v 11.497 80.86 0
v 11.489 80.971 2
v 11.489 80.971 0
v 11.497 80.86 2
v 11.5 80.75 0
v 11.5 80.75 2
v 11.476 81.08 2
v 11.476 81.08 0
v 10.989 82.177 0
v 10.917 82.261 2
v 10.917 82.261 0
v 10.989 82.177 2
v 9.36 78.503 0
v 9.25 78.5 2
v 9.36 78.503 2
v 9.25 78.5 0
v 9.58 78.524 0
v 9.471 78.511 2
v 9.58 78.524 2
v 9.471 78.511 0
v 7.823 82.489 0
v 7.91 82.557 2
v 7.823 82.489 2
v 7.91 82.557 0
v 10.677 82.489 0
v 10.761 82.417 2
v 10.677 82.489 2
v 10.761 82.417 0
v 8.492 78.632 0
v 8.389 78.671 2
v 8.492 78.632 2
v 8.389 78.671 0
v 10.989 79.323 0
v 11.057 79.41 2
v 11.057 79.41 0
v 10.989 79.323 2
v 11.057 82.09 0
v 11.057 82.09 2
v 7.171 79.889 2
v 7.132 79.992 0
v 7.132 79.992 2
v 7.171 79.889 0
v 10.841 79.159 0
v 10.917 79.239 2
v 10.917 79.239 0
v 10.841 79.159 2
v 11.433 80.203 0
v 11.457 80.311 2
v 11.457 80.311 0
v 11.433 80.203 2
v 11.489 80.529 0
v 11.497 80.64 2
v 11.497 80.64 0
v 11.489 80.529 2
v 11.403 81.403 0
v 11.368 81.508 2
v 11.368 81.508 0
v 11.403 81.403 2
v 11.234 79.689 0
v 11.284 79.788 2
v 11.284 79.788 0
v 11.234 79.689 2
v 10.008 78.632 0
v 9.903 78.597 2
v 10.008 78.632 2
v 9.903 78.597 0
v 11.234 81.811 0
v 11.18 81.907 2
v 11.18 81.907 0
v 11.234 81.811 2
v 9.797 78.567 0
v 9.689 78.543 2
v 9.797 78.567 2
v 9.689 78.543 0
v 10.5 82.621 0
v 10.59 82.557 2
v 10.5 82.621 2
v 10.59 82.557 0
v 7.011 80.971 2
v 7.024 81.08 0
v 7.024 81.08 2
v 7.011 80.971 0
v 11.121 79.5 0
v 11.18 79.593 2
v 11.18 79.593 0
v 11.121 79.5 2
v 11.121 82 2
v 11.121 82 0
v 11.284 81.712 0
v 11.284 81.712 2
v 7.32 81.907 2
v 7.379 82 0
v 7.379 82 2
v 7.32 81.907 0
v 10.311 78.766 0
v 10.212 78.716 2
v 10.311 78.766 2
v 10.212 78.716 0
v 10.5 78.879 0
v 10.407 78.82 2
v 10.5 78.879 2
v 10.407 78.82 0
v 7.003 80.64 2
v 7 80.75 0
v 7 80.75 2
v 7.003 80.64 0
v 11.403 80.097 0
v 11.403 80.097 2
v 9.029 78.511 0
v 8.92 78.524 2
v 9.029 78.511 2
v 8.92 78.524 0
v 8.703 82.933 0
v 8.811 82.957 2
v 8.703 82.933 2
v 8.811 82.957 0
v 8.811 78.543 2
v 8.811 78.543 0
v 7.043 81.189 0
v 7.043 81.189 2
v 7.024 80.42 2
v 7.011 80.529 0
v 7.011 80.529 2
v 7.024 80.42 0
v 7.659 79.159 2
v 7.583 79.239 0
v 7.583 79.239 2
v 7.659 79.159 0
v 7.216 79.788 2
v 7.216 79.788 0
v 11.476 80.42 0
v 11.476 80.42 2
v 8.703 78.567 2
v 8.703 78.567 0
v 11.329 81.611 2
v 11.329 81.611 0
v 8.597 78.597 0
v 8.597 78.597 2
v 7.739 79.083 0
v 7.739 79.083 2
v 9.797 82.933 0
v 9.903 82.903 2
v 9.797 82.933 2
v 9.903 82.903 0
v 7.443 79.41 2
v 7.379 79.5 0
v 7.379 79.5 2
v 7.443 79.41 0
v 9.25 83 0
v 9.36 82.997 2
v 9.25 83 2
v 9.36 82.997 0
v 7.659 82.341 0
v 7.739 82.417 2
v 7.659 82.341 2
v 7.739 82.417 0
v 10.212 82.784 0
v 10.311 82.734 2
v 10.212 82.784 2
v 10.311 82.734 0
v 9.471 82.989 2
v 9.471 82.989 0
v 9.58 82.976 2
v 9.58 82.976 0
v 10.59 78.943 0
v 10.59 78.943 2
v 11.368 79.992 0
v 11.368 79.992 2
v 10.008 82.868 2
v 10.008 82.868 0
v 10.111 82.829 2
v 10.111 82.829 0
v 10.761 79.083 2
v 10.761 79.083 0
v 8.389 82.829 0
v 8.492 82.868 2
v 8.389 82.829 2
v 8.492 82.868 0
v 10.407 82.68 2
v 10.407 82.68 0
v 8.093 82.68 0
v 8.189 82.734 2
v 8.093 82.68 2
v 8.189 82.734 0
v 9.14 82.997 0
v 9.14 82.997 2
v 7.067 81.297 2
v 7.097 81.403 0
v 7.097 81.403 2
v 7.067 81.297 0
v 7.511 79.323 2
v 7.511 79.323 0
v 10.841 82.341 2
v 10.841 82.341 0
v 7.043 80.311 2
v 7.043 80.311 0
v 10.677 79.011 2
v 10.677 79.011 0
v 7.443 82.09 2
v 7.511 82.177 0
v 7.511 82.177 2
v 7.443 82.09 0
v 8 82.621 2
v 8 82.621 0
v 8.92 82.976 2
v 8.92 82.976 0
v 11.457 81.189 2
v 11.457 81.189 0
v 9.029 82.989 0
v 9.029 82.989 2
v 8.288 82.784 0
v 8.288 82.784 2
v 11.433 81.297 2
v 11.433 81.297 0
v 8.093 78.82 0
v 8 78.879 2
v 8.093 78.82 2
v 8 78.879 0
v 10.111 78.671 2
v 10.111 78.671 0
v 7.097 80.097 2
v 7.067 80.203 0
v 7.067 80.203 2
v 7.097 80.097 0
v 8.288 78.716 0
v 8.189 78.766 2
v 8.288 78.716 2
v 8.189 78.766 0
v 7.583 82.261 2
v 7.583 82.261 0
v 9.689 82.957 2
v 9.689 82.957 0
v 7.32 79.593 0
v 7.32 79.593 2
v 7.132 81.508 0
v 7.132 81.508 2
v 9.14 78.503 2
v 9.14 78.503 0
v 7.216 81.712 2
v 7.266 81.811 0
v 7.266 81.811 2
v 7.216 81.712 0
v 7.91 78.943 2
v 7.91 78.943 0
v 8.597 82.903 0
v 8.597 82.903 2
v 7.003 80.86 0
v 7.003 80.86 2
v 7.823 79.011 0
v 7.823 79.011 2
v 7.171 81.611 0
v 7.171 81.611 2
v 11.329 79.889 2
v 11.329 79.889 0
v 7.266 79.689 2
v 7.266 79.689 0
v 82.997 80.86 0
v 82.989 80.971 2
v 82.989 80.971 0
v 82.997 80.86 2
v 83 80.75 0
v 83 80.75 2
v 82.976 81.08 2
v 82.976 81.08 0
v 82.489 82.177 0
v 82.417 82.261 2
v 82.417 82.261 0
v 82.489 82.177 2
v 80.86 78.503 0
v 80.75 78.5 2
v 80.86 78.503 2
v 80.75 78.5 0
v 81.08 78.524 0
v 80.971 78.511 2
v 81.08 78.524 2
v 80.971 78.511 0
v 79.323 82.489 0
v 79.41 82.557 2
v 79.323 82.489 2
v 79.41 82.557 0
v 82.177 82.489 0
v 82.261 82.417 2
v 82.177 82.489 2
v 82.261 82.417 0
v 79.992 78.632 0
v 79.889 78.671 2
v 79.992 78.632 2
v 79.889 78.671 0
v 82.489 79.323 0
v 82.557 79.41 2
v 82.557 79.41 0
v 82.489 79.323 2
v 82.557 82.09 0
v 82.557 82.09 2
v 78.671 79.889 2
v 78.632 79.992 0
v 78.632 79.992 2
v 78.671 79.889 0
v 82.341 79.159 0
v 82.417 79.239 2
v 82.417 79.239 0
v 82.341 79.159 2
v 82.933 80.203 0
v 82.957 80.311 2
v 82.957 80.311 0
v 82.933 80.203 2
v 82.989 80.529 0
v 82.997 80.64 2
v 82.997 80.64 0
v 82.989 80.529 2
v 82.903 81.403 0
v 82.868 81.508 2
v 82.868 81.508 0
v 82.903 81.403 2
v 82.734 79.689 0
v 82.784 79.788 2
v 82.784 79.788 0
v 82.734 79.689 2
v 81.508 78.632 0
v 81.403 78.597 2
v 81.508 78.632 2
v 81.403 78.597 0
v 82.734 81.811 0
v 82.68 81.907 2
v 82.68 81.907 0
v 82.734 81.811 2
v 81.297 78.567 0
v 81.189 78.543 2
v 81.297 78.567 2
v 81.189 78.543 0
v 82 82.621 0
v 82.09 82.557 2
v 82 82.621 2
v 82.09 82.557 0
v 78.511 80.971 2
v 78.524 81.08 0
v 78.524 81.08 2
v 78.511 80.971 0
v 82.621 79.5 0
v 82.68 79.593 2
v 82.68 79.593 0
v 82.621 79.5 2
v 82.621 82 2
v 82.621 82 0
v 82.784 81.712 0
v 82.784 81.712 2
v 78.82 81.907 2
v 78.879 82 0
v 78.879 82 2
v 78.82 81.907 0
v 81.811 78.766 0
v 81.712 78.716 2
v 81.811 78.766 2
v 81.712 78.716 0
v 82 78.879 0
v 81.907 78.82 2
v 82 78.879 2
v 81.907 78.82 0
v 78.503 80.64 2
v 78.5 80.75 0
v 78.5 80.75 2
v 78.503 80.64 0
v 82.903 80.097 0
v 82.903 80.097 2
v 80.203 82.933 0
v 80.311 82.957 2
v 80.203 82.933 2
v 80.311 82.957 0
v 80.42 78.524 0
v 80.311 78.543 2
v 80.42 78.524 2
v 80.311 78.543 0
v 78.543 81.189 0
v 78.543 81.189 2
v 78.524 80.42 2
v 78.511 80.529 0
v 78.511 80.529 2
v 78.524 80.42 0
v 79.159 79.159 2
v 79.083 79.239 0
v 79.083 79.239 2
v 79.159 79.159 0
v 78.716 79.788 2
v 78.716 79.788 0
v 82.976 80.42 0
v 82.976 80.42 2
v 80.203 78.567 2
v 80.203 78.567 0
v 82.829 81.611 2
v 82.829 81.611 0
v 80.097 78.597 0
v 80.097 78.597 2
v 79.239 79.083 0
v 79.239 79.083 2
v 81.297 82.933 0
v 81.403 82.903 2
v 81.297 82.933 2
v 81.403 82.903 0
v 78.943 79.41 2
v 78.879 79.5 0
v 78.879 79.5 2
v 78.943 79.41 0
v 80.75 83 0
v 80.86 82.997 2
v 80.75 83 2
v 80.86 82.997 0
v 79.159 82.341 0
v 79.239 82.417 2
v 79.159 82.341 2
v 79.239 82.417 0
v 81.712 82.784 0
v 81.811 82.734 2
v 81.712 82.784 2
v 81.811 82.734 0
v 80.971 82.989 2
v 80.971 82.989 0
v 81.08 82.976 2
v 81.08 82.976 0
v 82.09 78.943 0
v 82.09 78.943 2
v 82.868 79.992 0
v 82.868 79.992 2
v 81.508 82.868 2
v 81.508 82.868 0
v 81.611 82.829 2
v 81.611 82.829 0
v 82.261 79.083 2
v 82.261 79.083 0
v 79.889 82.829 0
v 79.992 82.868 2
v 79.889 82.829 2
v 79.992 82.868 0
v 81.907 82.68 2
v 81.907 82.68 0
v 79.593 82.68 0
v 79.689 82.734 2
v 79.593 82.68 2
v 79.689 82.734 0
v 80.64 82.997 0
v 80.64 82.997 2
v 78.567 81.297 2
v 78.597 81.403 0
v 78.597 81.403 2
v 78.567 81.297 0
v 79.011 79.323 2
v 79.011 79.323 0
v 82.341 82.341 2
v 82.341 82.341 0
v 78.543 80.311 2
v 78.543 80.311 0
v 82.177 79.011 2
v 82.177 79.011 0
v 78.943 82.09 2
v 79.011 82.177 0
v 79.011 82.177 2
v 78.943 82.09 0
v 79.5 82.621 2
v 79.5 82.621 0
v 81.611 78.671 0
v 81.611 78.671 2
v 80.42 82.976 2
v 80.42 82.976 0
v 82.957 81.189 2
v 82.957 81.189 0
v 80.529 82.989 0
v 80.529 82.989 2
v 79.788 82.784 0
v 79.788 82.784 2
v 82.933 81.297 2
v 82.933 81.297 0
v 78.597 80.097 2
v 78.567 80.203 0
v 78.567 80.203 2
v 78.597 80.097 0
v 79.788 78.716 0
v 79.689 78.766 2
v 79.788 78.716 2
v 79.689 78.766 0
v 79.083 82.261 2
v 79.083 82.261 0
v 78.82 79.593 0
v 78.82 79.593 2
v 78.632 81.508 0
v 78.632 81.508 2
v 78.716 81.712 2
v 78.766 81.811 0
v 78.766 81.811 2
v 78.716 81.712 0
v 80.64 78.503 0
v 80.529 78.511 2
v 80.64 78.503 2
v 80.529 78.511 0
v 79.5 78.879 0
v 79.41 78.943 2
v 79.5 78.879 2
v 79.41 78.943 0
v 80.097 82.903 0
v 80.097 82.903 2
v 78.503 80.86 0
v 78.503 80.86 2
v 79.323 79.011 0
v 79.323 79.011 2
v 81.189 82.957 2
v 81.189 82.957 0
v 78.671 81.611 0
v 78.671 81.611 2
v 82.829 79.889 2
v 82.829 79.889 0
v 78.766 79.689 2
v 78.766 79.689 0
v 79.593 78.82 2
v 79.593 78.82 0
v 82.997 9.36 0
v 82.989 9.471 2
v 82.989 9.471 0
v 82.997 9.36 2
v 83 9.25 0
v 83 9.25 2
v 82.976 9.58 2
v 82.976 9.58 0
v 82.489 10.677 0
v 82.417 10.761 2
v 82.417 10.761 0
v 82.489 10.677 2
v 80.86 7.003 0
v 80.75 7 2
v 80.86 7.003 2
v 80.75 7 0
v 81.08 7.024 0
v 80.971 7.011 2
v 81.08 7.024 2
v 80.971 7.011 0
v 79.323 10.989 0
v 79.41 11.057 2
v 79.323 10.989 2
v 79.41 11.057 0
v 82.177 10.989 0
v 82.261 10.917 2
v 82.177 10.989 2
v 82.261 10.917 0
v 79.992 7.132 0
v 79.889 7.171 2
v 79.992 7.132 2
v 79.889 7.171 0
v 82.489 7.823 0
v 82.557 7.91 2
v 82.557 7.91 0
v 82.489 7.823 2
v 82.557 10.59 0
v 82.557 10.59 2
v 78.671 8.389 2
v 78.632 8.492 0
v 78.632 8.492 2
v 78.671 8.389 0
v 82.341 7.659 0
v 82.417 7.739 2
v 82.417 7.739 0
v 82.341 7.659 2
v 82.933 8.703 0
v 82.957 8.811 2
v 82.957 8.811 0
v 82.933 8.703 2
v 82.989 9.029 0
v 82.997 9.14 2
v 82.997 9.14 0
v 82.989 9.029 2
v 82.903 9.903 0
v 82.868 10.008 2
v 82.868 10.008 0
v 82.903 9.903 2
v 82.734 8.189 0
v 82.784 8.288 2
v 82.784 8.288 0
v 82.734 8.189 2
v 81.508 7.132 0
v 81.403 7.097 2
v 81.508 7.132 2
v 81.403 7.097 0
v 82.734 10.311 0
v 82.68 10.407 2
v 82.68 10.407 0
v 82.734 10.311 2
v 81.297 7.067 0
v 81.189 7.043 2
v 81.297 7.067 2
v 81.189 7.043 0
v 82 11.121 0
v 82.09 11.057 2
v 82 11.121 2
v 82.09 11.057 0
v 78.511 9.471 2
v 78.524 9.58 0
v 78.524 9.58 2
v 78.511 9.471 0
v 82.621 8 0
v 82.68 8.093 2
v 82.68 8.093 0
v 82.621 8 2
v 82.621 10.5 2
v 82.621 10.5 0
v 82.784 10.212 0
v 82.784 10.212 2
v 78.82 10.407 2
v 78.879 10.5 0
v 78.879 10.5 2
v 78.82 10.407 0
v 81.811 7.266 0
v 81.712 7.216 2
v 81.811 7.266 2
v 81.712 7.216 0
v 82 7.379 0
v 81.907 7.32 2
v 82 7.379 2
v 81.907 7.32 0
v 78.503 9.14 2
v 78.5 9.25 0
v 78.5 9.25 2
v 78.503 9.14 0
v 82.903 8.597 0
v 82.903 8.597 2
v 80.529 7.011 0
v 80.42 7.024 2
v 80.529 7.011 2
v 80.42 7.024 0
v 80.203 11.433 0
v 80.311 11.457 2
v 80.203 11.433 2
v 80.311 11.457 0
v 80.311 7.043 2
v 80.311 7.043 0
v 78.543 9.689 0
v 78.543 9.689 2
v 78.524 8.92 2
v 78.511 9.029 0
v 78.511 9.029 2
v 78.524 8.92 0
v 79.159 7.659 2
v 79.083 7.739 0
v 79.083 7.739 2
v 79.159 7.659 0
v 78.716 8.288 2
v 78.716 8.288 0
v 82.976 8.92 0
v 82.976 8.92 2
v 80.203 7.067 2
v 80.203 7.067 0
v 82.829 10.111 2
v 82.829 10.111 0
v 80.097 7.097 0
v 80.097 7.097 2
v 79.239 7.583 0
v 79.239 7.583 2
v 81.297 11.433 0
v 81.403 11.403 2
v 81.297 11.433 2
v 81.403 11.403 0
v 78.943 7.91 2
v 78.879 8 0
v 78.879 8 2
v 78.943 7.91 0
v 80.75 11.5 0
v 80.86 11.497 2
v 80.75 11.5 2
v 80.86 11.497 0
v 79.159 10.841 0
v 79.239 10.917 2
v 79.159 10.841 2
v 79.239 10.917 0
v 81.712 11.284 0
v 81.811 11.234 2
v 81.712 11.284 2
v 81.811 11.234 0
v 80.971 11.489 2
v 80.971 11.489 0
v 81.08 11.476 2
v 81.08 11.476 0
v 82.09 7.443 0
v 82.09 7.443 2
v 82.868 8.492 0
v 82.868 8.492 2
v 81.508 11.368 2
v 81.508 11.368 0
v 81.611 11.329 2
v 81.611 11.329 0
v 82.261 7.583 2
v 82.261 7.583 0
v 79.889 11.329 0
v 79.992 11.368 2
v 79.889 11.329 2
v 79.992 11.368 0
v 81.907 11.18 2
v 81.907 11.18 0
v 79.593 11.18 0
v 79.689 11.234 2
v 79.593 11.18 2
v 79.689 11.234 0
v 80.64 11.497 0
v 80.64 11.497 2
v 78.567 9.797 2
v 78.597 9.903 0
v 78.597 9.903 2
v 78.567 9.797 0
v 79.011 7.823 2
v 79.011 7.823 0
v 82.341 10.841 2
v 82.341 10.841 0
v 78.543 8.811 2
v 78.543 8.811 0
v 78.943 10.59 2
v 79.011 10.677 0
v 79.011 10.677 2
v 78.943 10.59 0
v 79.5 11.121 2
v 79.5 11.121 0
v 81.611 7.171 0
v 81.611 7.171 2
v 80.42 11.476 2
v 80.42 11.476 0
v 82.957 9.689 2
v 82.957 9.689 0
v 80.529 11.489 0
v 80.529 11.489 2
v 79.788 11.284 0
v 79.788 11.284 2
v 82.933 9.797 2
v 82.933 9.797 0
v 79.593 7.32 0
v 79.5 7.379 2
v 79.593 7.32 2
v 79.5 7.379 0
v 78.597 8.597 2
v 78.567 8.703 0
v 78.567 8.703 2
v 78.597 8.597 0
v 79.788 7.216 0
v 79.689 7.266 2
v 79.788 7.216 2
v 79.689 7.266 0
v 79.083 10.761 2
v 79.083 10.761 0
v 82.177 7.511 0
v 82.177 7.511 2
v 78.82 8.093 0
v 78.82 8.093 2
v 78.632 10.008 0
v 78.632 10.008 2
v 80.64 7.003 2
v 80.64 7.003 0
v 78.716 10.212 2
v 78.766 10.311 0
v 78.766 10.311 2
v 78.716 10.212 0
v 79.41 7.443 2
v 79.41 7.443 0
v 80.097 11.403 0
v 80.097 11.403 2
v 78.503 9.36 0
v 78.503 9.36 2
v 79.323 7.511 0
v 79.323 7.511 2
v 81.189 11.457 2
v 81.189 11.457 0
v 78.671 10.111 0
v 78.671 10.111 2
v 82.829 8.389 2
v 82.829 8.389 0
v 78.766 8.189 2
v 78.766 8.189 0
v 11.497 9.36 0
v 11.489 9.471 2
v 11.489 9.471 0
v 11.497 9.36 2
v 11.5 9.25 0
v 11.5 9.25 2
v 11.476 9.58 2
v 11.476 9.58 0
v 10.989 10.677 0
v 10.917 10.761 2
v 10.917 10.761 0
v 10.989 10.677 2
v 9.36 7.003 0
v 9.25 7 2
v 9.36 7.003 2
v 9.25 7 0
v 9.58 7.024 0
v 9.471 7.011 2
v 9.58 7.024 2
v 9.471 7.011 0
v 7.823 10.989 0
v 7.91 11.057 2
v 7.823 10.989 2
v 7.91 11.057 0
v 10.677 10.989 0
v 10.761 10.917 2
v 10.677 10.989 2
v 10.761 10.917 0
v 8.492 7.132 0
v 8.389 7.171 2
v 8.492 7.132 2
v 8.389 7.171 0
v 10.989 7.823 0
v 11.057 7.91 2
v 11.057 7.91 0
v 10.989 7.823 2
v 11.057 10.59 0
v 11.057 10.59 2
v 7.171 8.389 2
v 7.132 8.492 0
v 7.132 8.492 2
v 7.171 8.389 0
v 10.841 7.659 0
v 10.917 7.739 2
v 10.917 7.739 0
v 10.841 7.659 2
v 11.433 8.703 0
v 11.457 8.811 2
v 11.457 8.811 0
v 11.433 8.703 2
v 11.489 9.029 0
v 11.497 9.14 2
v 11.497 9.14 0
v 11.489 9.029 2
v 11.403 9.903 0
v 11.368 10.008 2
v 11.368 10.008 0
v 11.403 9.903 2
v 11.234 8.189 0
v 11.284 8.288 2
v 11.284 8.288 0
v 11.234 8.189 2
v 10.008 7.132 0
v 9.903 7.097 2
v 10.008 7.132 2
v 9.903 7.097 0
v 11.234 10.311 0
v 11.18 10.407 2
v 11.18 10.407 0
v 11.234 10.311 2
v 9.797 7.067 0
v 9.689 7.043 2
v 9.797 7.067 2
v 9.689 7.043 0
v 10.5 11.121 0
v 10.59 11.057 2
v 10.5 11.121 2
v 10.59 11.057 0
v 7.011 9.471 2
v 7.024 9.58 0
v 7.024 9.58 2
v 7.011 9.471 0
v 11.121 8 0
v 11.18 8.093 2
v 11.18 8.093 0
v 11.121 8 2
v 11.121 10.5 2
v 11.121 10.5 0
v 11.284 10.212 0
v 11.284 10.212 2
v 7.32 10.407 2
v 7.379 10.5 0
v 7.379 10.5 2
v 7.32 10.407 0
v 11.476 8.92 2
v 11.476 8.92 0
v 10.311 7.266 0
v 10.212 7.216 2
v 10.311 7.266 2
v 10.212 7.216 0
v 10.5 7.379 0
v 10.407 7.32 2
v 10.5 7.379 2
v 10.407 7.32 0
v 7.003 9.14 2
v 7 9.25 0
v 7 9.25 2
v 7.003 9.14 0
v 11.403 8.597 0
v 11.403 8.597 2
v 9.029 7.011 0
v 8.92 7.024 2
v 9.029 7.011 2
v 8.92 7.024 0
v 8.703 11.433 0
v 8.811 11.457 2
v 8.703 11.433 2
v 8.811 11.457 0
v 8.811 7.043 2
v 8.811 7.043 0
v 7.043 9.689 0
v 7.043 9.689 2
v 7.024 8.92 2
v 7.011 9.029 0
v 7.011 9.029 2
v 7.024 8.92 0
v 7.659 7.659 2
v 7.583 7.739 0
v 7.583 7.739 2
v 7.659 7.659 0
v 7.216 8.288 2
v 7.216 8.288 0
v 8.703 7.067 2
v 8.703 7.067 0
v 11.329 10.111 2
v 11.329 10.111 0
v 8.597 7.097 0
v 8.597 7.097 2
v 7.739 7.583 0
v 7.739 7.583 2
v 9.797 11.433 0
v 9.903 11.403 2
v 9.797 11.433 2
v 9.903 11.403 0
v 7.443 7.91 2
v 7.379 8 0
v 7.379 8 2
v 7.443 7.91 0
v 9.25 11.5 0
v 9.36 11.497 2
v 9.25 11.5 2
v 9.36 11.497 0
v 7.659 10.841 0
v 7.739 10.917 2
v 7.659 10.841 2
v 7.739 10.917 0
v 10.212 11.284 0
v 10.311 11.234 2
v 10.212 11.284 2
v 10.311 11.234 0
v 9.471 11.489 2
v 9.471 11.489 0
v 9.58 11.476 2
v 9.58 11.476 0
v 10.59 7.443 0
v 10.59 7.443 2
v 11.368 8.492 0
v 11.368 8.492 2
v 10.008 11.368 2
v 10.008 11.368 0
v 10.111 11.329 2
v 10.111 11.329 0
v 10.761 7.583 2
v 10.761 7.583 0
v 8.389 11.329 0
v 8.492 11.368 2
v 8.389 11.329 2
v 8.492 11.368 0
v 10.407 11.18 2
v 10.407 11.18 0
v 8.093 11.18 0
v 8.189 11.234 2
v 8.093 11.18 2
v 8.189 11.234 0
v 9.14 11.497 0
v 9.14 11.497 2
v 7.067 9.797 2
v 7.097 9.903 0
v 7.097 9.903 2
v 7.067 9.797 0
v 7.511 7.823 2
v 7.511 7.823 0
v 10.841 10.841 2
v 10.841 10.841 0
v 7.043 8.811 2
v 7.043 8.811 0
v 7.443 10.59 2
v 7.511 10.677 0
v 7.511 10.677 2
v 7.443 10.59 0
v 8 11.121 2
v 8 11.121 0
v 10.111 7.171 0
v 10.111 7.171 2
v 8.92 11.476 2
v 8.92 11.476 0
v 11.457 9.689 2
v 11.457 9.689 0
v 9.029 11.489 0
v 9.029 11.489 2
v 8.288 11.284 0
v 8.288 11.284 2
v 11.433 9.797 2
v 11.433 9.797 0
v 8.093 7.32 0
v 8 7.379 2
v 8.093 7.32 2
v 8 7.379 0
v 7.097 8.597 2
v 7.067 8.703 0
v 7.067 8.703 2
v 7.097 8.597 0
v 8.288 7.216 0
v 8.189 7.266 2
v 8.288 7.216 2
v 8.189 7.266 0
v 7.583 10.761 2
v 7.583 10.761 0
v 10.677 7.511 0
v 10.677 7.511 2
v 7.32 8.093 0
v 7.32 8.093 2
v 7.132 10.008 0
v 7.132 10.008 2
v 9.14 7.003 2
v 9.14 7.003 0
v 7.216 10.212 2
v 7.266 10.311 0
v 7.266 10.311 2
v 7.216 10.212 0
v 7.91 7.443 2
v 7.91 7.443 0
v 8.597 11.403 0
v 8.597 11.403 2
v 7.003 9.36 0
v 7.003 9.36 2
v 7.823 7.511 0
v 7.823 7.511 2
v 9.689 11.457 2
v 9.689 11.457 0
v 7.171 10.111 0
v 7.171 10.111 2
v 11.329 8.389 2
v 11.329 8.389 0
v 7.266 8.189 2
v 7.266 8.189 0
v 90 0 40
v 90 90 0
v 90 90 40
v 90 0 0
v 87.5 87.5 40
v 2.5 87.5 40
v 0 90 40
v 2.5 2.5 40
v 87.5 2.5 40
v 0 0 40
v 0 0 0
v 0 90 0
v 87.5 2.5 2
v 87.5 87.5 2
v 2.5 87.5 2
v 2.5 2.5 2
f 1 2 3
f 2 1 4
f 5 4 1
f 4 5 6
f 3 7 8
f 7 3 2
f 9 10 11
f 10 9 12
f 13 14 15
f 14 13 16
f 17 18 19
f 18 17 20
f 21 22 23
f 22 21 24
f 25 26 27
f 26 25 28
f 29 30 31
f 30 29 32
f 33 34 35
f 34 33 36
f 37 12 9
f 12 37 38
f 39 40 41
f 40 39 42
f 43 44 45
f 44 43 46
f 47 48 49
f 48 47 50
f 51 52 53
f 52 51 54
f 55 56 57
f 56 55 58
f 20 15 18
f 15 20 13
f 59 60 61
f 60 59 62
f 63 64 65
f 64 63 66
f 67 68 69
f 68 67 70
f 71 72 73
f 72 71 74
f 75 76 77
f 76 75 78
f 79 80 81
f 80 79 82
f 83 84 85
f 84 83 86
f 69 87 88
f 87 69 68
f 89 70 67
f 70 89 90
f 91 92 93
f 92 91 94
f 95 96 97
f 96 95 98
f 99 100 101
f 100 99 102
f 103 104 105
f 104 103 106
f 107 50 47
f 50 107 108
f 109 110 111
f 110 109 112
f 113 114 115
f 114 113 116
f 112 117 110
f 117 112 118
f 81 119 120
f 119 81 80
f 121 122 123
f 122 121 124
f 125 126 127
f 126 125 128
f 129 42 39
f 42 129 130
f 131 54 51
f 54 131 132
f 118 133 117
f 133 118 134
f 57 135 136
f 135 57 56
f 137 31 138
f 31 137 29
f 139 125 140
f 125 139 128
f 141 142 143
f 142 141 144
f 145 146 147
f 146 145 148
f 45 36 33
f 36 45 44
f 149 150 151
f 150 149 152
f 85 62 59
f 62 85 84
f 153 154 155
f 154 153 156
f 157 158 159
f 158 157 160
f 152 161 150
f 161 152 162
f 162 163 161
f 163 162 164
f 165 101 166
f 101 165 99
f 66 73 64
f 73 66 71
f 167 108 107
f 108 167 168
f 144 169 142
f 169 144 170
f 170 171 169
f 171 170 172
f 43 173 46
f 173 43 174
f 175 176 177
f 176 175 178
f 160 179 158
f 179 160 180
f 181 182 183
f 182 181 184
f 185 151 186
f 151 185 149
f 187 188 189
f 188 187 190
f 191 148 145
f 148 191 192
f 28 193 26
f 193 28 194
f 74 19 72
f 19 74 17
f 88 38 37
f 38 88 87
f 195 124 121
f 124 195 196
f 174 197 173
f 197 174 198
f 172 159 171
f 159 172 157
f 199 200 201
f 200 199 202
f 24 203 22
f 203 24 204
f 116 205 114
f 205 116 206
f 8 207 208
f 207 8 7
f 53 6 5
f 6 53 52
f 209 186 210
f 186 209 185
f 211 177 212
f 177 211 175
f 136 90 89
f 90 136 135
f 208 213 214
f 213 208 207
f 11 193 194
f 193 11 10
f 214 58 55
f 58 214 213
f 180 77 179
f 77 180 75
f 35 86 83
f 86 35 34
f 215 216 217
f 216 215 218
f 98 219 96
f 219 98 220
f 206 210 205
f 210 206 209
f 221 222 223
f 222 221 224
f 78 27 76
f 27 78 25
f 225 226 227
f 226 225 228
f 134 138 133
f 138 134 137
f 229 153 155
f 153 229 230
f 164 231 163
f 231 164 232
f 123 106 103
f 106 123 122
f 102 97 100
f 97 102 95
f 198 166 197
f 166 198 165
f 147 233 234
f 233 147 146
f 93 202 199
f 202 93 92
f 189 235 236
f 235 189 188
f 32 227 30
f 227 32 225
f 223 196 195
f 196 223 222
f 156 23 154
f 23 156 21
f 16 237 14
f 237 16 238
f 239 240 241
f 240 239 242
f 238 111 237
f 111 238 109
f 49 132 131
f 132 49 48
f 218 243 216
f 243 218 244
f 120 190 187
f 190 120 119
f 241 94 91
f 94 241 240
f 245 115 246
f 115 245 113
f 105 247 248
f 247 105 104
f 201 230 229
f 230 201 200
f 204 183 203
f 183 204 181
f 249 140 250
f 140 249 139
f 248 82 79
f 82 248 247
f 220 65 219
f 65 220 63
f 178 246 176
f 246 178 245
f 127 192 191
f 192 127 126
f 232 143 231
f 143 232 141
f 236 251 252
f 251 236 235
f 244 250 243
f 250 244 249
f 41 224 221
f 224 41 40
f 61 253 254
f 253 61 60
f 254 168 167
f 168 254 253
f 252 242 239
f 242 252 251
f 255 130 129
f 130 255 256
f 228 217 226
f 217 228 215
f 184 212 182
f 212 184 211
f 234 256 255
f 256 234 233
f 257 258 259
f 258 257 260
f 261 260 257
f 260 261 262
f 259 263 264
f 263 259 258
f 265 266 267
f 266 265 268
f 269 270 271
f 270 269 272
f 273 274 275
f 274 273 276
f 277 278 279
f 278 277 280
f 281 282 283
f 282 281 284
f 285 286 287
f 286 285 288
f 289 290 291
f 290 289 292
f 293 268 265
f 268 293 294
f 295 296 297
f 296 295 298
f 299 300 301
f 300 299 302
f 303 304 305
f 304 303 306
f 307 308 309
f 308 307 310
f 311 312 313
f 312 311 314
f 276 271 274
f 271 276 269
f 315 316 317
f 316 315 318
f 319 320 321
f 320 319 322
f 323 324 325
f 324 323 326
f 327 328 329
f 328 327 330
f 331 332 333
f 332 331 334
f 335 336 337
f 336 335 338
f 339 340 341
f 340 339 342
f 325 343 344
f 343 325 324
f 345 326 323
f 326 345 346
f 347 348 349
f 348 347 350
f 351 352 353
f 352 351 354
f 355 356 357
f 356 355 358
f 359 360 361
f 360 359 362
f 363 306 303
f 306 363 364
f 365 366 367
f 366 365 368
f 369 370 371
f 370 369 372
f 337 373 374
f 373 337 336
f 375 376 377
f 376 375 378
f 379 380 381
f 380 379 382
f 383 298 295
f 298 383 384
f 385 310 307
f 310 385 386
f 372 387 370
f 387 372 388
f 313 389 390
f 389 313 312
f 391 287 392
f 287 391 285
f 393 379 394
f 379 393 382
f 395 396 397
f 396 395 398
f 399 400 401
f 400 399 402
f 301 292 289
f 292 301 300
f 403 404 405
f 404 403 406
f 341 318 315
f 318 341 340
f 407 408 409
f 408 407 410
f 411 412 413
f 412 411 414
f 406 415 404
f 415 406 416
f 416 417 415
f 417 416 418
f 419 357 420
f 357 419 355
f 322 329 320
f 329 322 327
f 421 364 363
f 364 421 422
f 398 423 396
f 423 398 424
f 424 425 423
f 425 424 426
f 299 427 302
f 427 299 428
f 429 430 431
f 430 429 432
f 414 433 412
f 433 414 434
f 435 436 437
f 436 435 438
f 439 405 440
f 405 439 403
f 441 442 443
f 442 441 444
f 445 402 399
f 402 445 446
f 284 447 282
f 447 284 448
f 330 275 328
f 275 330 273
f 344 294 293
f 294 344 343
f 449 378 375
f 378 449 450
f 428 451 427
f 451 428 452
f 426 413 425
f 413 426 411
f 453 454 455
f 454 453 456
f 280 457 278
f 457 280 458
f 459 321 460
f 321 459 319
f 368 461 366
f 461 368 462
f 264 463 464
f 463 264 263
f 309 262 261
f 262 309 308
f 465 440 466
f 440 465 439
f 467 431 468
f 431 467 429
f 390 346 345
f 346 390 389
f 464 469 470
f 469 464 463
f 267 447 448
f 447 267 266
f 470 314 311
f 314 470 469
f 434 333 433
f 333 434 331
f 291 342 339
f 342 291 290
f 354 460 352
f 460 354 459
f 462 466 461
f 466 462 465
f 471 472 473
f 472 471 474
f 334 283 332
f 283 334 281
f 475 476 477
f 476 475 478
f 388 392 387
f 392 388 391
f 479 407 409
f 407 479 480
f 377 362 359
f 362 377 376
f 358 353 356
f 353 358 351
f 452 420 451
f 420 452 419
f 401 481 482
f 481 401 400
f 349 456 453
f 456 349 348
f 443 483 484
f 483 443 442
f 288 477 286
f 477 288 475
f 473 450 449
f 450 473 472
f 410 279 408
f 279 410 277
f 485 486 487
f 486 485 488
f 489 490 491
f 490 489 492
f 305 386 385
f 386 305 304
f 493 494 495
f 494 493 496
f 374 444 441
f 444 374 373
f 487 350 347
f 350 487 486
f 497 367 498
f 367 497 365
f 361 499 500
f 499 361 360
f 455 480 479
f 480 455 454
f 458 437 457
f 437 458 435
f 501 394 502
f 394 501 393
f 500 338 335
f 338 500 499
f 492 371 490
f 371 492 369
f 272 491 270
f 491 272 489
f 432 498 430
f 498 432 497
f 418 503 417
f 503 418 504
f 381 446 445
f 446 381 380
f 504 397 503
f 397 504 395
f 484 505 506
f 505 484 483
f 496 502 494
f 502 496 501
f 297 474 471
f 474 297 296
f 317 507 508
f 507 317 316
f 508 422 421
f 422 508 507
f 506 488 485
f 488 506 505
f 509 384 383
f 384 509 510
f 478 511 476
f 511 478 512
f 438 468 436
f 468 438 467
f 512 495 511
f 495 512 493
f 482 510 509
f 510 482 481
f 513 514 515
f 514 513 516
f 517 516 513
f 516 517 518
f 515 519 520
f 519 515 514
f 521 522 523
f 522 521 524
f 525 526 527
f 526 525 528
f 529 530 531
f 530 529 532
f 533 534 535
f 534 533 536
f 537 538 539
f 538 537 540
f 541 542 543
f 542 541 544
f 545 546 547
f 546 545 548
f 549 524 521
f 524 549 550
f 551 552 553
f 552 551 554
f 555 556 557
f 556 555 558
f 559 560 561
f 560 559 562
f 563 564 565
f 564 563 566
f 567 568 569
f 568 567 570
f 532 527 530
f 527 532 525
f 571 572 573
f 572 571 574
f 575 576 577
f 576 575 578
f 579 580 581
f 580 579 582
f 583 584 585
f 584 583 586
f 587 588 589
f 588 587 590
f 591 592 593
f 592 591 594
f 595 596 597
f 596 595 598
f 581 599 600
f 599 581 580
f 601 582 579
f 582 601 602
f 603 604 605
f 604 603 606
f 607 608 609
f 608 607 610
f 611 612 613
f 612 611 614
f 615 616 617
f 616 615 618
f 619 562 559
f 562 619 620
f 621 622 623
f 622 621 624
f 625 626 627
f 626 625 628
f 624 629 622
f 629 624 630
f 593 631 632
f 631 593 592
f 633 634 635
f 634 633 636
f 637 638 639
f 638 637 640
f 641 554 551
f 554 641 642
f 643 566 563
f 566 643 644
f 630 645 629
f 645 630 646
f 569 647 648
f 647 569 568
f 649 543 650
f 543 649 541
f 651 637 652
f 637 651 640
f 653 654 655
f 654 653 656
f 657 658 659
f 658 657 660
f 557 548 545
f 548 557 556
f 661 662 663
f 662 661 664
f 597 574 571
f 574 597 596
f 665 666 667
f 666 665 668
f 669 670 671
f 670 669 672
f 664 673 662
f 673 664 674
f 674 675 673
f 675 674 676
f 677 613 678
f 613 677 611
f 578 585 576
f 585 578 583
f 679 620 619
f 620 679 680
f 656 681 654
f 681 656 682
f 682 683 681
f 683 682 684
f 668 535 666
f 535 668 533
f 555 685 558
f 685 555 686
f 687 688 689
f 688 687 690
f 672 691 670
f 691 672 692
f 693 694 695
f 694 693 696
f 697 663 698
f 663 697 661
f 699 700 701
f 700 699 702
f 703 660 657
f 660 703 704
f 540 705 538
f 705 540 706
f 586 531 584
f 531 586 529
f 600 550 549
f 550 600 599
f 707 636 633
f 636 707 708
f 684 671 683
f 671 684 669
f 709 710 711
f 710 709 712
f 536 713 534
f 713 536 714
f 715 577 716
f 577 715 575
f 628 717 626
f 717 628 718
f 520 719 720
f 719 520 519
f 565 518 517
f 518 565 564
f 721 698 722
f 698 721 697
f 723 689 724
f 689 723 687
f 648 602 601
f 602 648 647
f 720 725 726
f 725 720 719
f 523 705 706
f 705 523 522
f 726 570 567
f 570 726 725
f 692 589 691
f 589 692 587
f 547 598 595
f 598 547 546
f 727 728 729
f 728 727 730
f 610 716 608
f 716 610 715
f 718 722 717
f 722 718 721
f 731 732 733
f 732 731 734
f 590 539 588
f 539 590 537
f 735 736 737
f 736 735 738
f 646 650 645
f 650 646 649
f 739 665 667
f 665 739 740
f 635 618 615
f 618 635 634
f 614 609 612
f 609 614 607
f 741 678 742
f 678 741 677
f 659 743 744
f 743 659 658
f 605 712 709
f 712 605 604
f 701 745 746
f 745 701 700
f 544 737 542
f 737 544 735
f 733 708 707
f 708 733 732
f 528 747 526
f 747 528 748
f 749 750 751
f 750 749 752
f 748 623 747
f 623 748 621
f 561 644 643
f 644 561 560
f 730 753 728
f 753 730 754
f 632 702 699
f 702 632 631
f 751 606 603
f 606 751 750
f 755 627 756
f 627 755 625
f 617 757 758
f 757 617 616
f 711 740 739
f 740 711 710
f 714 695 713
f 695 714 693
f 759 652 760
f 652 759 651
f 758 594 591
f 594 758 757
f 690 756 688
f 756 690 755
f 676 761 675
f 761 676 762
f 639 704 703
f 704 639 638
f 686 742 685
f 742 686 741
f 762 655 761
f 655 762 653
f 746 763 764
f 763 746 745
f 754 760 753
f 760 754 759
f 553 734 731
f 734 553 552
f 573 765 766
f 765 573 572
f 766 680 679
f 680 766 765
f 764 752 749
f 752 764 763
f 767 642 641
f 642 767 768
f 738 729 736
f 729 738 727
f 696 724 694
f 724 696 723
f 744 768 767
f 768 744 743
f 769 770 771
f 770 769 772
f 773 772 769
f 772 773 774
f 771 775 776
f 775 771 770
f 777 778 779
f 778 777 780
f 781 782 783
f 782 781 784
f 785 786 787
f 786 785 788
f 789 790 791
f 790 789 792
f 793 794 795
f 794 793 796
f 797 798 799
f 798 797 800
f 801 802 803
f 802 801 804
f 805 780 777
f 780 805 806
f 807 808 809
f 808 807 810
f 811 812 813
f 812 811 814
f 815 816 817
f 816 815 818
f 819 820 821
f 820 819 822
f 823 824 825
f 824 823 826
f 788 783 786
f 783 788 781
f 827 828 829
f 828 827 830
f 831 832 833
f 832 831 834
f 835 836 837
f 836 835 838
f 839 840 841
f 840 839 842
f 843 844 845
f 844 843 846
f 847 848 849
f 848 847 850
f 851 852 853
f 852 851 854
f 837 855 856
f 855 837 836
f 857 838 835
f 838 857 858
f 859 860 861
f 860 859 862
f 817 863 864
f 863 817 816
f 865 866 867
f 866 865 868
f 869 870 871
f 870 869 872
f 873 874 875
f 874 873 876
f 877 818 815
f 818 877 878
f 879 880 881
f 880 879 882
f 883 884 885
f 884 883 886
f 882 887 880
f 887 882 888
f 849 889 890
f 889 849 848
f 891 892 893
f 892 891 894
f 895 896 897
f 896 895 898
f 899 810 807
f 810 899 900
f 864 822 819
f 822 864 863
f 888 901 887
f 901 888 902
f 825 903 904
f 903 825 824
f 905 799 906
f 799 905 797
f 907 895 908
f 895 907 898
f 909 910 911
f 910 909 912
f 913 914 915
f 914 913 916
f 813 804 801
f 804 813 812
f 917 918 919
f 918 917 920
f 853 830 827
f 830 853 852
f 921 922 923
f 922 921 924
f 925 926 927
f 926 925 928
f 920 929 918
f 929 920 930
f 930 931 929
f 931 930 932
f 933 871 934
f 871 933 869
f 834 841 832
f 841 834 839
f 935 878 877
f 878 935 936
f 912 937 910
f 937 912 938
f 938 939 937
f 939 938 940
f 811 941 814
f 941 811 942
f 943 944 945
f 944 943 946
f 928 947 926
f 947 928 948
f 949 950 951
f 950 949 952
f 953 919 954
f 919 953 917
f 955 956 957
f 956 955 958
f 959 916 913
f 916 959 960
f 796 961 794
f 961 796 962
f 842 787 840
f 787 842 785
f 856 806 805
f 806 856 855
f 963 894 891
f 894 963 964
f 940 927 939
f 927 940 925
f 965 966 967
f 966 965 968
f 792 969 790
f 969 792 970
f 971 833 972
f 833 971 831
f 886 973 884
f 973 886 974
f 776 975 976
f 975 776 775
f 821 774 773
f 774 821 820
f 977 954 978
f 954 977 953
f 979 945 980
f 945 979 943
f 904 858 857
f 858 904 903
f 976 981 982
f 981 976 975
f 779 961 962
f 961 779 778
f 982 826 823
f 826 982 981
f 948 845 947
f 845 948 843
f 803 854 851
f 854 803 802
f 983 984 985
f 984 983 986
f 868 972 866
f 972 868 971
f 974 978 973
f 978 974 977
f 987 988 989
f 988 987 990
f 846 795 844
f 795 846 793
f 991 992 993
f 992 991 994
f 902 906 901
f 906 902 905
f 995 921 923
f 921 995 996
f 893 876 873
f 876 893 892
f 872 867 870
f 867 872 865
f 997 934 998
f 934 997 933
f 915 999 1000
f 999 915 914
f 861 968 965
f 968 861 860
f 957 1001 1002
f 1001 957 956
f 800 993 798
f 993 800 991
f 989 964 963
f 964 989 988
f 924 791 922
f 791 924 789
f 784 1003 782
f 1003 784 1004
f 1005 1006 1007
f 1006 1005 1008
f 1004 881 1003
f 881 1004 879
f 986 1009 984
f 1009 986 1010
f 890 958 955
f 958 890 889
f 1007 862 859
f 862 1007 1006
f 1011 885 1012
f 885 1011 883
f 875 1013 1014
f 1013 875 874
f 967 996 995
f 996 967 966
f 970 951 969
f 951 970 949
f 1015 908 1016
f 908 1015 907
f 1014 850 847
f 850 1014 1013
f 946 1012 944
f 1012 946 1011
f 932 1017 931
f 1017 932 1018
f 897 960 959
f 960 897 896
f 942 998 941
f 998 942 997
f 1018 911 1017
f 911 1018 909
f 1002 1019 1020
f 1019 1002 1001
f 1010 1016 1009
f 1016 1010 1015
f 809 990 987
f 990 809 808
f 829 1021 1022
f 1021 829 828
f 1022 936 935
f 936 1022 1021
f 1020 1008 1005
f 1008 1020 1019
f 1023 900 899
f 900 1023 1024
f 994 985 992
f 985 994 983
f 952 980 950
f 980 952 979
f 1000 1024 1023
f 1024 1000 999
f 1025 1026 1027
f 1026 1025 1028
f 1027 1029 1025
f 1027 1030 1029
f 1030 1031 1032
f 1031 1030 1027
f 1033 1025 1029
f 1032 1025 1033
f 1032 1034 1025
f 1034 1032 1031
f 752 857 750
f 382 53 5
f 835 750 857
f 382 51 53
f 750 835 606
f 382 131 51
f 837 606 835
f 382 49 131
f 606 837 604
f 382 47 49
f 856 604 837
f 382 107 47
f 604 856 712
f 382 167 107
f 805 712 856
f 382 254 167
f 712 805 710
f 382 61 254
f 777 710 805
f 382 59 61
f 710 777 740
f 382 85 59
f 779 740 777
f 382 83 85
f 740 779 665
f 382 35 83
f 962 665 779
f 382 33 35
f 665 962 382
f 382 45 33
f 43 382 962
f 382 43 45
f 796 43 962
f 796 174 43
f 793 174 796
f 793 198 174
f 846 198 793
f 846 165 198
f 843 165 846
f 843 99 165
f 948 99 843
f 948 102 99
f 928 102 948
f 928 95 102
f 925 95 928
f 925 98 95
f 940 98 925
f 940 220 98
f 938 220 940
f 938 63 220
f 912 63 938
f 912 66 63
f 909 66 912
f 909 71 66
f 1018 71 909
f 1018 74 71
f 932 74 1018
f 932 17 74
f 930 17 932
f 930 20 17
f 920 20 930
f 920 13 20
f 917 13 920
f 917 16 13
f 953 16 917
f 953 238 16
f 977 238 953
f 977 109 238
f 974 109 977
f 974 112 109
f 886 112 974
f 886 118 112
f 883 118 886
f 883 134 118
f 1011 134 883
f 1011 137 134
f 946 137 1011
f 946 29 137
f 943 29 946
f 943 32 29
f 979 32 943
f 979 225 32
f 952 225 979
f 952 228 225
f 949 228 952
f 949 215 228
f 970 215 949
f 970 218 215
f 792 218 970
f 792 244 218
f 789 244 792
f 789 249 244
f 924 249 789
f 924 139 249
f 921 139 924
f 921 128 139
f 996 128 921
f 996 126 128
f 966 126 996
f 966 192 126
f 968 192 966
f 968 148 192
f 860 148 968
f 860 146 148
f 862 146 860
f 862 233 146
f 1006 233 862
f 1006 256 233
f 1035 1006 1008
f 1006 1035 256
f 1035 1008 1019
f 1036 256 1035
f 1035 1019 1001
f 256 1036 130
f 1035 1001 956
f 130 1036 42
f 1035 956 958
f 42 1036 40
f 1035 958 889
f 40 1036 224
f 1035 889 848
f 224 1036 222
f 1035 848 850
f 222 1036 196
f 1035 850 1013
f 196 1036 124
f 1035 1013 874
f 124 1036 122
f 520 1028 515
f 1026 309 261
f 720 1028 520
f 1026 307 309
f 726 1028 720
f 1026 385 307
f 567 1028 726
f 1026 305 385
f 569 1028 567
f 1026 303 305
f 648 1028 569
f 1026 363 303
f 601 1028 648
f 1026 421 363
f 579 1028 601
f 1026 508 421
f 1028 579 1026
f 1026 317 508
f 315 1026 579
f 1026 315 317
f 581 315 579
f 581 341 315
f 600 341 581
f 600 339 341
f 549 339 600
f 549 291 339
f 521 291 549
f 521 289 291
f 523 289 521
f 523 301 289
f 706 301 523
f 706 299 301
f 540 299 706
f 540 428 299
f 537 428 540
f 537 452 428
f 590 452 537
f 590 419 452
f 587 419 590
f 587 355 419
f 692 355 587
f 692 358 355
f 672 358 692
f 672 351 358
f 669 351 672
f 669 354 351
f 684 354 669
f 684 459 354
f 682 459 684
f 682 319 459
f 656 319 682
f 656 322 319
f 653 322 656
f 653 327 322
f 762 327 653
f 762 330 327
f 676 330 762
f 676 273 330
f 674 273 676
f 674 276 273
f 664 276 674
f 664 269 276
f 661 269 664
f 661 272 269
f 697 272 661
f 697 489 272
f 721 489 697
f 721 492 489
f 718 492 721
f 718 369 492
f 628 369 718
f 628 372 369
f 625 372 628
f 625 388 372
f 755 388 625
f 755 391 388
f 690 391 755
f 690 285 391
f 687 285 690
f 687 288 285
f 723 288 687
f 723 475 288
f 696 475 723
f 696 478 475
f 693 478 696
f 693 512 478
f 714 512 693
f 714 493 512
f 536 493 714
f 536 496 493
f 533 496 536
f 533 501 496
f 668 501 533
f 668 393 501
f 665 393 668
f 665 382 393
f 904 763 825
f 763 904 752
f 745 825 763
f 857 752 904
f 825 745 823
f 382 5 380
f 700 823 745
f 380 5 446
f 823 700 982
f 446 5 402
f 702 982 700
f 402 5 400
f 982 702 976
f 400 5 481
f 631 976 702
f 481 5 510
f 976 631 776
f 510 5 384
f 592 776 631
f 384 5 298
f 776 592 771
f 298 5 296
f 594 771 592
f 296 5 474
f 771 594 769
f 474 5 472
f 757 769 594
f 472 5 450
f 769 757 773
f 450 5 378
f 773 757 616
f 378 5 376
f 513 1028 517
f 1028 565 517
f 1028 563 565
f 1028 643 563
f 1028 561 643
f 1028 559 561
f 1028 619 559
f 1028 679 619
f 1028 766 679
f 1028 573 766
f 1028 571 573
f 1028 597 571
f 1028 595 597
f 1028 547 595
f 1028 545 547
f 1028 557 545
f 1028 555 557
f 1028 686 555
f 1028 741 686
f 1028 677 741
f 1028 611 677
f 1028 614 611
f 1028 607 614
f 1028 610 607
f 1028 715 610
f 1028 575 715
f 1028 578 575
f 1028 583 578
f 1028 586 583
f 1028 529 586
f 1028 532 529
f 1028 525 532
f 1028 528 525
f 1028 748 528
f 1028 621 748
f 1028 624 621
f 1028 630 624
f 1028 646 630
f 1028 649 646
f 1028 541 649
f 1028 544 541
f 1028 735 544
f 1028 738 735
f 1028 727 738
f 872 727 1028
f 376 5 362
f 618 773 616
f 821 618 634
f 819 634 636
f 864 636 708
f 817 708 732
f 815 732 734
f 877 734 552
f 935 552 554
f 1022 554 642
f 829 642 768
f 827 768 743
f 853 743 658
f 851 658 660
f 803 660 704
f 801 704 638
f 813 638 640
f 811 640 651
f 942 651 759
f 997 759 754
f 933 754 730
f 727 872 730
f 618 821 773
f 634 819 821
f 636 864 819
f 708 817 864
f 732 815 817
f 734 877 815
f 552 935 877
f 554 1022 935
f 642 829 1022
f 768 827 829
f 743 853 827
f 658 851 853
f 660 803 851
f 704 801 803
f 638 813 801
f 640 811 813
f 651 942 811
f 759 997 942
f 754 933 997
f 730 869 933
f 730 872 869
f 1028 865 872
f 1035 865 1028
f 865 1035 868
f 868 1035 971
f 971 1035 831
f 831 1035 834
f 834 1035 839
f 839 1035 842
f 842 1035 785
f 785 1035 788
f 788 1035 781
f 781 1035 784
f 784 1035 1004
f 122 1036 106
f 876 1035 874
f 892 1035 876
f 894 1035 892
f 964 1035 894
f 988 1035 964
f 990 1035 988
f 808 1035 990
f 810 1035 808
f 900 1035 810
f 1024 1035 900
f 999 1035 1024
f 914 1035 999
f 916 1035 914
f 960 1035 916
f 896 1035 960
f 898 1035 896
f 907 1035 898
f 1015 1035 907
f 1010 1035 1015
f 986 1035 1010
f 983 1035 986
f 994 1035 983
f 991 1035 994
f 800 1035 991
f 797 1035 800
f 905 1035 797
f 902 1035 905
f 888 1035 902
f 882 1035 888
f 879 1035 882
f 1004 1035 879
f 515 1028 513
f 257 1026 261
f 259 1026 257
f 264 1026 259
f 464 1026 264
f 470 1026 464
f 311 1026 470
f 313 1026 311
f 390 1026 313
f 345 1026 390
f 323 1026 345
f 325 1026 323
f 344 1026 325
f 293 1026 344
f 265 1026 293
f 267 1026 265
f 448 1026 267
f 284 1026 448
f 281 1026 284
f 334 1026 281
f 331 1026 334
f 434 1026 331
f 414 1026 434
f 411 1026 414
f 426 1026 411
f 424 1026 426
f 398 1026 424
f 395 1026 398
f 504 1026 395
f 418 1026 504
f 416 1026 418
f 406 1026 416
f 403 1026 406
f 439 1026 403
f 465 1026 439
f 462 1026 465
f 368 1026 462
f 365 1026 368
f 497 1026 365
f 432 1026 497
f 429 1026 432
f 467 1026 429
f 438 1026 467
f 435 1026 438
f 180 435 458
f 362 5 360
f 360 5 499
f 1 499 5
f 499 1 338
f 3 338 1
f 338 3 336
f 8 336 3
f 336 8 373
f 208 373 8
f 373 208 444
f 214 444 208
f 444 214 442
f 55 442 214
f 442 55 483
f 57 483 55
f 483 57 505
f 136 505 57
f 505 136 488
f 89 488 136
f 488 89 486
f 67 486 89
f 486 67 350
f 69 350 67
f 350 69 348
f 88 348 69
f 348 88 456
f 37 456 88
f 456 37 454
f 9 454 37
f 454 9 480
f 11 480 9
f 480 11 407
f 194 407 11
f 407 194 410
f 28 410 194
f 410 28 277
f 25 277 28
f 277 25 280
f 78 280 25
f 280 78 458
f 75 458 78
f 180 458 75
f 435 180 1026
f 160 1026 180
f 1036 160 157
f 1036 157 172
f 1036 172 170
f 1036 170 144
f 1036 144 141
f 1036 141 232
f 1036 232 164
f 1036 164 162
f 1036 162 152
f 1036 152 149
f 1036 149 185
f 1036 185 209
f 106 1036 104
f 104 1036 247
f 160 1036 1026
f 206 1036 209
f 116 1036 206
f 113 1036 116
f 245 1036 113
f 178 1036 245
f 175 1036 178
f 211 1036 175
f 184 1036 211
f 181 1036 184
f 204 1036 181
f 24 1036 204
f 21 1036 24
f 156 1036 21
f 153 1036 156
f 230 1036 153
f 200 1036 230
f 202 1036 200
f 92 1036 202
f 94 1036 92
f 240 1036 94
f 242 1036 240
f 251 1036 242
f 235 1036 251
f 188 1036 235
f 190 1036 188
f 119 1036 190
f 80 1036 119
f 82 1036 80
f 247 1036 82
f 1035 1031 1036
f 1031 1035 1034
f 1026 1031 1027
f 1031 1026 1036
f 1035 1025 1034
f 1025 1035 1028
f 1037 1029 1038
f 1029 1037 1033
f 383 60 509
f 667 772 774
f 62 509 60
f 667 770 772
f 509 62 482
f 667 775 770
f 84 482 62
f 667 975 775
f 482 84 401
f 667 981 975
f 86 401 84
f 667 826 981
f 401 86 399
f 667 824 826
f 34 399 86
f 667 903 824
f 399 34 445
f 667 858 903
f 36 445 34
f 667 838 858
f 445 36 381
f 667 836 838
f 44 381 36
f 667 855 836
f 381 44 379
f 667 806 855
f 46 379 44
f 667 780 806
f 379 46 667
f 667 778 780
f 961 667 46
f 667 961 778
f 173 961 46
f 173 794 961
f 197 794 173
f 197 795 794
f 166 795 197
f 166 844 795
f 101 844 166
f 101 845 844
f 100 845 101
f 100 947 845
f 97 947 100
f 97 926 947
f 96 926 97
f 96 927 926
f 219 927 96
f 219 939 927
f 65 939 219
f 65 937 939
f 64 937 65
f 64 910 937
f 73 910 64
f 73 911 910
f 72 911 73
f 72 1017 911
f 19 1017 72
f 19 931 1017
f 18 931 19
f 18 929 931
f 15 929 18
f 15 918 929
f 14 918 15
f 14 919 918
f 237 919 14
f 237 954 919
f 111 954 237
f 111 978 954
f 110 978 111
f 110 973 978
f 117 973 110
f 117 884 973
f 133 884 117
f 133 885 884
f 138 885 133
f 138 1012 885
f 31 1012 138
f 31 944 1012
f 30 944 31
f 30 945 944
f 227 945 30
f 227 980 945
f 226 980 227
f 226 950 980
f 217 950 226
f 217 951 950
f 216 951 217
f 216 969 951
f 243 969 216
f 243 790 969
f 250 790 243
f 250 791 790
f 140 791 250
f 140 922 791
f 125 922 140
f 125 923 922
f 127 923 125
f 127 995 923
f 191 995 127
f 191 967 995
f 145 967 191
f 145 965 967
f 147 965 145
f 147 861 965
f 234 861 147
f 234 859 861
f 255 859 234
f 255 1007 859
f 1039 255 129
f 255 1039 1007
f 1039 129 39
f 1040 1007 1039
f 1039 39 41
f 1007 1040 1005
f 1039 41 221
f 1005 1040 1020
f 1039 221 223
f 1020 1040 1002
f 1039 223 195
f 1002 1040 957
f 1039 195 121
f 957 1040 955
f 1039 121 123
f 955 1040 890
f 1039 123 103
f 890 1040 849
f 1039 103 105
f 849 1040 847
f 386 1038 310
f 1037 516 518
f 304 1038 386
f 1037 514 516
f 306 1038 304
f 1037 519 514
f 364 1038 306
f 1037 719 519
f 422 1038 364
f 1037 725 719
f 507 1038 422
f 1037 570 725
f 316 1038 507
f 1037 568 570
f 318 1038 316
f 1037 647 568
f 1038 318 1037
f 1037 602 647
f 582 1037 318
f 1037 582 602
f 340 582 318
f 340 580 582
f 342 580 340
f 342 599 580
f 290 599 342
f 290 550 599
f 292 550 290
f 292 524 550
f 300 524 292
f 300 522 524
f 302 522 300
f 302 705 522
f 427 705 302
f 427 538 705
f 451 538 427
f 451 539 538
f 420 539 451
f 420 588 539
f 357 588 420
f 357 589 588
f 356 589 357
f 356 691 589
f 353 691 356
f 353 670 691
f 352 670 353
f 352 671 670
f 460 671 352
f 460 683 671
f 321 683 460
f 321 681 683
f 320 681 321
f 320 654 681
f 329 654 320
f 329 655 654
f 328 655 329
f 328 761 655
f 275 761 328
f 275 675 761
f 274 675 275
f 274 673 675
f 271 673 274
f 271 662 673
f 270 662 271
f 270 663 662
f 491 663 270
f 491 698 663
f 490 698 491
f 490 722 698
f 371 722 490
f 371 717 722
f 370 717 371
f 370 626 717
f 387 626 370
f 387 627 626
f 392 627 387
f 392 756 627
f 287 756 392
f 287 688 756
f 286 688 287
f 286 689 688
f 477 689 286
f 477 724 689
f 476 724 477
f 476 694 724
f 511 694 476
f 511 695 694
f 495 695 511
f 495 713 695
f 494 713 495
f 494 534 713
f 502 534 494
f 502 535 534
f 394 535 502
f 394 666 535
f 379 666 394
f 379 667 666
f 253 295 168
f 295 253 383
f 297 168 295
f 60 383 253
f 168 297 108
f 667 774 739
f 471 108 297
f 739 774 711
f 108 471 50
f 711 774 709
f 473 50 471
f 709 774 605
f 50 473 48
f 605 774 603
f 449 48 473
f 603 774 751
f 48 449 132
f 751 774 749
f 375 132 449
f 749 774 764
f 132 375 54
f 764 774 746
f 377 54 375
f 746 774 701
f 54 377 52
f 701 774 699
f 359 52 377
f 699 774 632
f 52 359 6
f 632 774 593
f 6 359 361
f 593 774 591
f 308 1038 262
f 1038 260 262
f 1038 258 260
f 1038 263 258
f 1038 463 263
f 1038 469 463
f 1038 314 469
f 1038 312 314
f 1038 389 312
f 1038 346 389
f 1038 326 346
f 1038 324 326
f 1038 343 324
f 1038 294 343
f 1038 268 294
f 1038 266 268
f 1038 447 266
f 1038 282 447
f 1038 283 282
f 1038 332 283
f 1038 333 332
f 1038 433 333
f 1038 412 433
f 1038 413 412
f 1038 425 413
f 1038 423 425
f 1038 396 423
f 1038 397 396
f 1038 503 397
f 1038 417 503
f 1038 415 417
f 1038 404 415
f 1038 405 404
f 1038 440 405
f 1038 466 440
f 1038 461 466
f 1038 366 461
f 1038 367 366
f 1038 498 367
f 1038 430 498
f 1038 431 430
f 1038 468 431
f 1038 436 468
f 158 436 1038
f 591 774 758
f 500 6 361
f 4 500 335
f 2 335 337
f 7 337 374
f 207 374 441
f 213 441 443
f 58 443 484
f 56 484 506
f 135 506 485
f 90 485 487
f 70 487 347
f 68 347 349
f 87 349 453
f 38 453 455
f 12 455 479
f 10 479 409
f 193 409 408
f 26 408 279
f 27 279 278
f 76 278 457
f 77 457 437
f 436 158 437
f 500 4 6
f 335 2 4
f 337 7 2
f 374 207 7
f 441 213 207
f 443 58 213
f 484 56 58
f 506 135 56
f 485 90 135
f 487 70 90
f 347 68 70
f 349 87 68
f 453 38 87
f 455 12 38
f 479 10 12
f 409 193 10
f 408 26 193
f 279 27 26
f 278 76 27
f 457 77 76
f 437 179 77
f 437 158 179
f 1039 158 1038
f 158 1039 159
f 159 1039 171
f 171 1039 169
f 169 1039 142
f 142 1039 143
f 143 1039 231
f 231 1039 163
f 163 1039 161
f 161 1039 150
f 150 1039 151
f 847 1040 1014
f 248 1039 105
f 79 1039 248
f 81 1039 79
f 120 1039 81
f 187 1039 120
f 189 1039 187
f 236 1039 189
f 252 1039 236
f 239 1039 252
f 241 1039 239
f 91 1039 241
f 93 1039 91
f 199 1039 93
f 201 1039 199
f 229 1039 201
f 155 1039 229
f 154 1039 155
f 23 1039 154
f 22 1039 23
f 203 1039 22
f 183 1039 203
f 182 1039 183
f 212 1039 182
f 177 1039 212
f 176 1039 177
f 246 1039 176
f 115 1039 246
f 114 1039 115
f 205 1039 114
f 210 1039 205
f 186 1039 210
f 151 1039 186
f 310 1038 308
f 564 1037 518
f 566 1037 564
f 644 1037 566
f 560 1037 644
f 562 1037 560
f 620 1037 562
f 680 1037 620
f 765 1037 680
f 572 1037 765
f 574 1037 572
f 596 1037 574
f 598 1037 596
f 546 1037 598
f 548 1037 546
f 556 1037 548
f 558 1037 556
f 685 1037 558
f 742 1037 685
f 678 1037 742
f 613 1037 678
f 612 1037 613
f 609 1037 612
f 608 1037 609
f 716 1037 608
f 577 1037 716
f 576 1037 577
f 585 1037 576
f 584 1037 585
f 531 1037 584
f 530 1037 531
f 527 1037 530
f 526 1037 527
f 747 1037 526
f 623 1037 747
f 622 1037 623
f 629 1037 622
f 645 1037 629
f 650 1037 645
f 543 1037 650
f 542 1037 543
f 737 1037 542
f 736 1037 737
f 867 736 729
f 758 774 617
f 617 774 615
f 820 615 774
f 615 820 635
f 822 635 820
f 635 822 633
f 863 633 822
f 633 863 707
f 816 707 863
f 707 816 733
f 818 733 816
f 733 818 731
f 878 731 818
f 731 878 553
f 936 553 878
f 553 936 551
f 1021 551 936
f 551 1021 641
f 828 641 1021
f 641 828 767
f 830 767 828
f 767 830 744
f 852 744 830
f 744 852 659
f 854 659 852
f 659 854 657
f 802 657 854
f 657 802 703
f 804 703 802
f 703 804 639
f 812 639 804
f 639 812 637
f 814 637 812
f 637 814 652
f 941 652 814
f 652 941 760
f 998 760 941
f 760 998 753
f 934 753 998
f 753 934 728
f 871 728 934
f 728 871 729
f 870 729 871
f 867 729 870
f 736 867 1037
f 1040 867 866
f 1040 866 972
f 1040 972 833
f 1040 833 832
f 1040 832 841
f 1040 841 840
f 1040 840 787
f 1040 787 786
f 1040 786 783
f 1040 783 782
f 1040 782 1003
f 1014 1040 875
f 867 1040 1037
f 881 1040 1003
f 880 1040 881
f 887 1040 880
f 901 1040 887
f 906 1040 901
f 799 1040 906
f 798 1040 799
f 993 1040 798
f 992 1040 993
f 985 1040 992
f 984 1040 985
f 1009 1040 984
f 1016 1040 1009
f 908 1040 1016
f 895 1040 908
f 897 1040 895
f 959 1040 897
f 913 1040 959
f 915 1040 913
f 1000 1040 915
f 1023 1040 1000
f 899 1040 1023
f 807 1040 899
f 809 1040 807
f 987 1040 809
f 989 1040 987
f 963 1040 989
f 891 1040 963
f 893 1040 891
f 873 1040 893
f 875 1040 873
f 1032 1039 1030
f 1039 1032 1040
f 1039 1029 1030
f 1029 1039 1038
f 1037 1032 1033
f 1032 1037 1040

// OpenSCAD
// DIY Magnetic Stirrer Housing
// Based on an 80mm PC case fan
// Print orientation: Upside down (Top plate on bed, walls rising up)

$fn = 128; // High resolution for clean holes and edges

// --- Dimensions ---
// Outer size of the box
W_OUT = 90;
H_OUT = 90;
D_OUT = 90;

// Wall thickness
W_THICK = 2.5;

// Top plate thickness
TOP_THICK = 2;

// Total height of the part (Top of walls)
TOTAL_HEIGHT = 40;

// Wall height (from top plate surface to open top)
WALL_HEIGHT = TOTAL_HEIGHT - TOP_THICK;

// Fan mounting hole pattern
// 4 holes on a square pattern, centred on the plate
// Distance between hole centers
PATTERN_SIZE = 71.5;
// Hole diameter for M4 screws
HOLE_DIA = 4.5;

// Cable notch dimensions
NOTCH_WIDTH = 12;
NOTCH_DEPTH = 8; // Reaches 8mm down from the open edge (z = 32 to z = 40)

// --- Calculated Positions ---
// Center of the top plate
X_CENTER = W_OUT / 2;
Y_CENTER = H_OUT / 2;

// Screw hole positions (relative to center)
// Pattern is 71.5mm square. Half is 35.75mm.
HOLE_OFFSET = PATTERN_SIZE / 2;

// Notch position (in the front wall, Y = Y_CENTER - W_THICK/2)
NOTCH_Y_POS = Y_CENTER - (W_THICK / 2);
NOTCH_X_POS = X_CENTER; // Centred along the wall

// --- Main Construction ---

module main_housing() {
    difference() {
        // 1. The main solid block
        // X: 0 to W_OUT
        // Y: 0 to H_OUT
        // Z: 0 to TOTAL_HEIGHT
        cube([W_OUT, H_OUT, TOTAL_HEIGHT], center = false);
        
        // 2. Cut the internal void (the open box part)
        // The void starts at Z = TOP_THICK and goes up to Z = TOTAL_HEIGHT
        // The void is inset by wall thickness on all sides
        void_x = W_OUT - (2 * W_THICK);
        void_y = H_OUT - (2 * W_THICK);
        void_z = WALL_HEIGHT;
        
        translate([W_THICK, W_THICK, TOP_THICK]) {
            cube([void_x, void_y, void_z]);
        }
        
        // 3. Cut Screw Holes
        // Holes are in the top plate (Z: 0 to TOP_THICK)
        // We extend slightly past the bottom (Z < 0) to ensure clean cut
        hole_z_start = -0.1;
        hole_z_end = TOP_THICK + 0.1;
        
        // Define hole positions explicitly to avoid scope issues
        hole_positions = [
            [X_CENTER - HOLE_OFFSET, Y_CENTER + HOLE_OFFSET],
            [X_CENTER + HOLE_OFFSET, Y_CENTER + HOLE_OFFSET],
            [X_CENTER + HOLE_OFFSET, Y_CENTER - HOLE_OFFSET],
            [X_CENTER - HOLE_OFFSET, Y_CENTER - HOLE_OFFSET]
        ];
        
        for (p = hole_positions) {
            tx = p[0];
            ty = p[1];
            
            translate([tx, ty, hole_z_start]) {
                cylinder(h = hole_z_end - hole_z_start, 
                          r = HOLE_DIA / 2, 
                          center = false);
            }
        }
        
        // 4. Cut Cable Notch
        // Located in the front wall (Y = NOTCH_Y_POS)
        // Extends from Z = 32 to Z = 40 (8mm deep from top)
        // Width is NOTCH_WIDTH, centered at X_CENTER
        // We extend slightly past the wall thickness in X to ensure clean cut
        
        notch_z_start = TOTAL_HEIGHT - NOTCH_DEPTH - 0.1; // 40 - 8 - 0.1 = 31.9
        notch_z_end = TOTAL_HEIGHT + 0.1;                  // 40.1
        
        notch_x_start = NOTCH_X_POS - (NOTCH_WIDTH / 2) - 0.1;
        notch_x_end = NOTCH_X_POS + (NOTCH_WIDTH / 2) + 0.1;
        
        translate([notch_x_start, NOTCH_Y_POS, notch_z_start]) {
            cube([NOTCH_WIDTH + 0.2, W_THICK + 0.2, NOTCH_DEPTH + 0.2]);
        }
    }
}

// Generate the part
main_housing();
